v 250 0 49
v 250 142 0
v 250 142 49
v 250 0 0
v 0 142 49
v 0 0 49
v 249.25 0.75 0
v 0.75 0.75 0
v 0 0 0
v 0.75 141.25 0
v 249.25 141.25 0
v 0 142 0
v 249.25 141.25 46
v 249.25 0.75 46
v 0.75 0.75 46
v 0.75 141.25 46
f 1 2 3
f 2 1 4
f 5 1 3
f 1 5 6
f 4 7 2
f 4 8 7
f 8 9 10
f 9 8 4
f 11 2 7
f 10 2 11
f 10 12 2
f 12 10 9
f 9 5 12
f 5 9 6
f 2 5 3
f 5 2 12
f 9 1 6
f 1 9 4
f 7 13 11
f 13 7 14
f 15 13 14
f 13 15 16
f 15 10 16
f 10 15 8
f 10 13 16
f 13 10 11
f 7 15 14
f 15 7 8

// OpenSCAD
$fn=48;
translate([0,0,0])
{
difference()
{
    cube(size = [250.00, 142.00, 49.00], center = false); 
    translate(v = [0.75, 0.75, 0.00])
    {
        cube(size = [248.50, 140.50, 46.00], center = false); 
    }
}

}
